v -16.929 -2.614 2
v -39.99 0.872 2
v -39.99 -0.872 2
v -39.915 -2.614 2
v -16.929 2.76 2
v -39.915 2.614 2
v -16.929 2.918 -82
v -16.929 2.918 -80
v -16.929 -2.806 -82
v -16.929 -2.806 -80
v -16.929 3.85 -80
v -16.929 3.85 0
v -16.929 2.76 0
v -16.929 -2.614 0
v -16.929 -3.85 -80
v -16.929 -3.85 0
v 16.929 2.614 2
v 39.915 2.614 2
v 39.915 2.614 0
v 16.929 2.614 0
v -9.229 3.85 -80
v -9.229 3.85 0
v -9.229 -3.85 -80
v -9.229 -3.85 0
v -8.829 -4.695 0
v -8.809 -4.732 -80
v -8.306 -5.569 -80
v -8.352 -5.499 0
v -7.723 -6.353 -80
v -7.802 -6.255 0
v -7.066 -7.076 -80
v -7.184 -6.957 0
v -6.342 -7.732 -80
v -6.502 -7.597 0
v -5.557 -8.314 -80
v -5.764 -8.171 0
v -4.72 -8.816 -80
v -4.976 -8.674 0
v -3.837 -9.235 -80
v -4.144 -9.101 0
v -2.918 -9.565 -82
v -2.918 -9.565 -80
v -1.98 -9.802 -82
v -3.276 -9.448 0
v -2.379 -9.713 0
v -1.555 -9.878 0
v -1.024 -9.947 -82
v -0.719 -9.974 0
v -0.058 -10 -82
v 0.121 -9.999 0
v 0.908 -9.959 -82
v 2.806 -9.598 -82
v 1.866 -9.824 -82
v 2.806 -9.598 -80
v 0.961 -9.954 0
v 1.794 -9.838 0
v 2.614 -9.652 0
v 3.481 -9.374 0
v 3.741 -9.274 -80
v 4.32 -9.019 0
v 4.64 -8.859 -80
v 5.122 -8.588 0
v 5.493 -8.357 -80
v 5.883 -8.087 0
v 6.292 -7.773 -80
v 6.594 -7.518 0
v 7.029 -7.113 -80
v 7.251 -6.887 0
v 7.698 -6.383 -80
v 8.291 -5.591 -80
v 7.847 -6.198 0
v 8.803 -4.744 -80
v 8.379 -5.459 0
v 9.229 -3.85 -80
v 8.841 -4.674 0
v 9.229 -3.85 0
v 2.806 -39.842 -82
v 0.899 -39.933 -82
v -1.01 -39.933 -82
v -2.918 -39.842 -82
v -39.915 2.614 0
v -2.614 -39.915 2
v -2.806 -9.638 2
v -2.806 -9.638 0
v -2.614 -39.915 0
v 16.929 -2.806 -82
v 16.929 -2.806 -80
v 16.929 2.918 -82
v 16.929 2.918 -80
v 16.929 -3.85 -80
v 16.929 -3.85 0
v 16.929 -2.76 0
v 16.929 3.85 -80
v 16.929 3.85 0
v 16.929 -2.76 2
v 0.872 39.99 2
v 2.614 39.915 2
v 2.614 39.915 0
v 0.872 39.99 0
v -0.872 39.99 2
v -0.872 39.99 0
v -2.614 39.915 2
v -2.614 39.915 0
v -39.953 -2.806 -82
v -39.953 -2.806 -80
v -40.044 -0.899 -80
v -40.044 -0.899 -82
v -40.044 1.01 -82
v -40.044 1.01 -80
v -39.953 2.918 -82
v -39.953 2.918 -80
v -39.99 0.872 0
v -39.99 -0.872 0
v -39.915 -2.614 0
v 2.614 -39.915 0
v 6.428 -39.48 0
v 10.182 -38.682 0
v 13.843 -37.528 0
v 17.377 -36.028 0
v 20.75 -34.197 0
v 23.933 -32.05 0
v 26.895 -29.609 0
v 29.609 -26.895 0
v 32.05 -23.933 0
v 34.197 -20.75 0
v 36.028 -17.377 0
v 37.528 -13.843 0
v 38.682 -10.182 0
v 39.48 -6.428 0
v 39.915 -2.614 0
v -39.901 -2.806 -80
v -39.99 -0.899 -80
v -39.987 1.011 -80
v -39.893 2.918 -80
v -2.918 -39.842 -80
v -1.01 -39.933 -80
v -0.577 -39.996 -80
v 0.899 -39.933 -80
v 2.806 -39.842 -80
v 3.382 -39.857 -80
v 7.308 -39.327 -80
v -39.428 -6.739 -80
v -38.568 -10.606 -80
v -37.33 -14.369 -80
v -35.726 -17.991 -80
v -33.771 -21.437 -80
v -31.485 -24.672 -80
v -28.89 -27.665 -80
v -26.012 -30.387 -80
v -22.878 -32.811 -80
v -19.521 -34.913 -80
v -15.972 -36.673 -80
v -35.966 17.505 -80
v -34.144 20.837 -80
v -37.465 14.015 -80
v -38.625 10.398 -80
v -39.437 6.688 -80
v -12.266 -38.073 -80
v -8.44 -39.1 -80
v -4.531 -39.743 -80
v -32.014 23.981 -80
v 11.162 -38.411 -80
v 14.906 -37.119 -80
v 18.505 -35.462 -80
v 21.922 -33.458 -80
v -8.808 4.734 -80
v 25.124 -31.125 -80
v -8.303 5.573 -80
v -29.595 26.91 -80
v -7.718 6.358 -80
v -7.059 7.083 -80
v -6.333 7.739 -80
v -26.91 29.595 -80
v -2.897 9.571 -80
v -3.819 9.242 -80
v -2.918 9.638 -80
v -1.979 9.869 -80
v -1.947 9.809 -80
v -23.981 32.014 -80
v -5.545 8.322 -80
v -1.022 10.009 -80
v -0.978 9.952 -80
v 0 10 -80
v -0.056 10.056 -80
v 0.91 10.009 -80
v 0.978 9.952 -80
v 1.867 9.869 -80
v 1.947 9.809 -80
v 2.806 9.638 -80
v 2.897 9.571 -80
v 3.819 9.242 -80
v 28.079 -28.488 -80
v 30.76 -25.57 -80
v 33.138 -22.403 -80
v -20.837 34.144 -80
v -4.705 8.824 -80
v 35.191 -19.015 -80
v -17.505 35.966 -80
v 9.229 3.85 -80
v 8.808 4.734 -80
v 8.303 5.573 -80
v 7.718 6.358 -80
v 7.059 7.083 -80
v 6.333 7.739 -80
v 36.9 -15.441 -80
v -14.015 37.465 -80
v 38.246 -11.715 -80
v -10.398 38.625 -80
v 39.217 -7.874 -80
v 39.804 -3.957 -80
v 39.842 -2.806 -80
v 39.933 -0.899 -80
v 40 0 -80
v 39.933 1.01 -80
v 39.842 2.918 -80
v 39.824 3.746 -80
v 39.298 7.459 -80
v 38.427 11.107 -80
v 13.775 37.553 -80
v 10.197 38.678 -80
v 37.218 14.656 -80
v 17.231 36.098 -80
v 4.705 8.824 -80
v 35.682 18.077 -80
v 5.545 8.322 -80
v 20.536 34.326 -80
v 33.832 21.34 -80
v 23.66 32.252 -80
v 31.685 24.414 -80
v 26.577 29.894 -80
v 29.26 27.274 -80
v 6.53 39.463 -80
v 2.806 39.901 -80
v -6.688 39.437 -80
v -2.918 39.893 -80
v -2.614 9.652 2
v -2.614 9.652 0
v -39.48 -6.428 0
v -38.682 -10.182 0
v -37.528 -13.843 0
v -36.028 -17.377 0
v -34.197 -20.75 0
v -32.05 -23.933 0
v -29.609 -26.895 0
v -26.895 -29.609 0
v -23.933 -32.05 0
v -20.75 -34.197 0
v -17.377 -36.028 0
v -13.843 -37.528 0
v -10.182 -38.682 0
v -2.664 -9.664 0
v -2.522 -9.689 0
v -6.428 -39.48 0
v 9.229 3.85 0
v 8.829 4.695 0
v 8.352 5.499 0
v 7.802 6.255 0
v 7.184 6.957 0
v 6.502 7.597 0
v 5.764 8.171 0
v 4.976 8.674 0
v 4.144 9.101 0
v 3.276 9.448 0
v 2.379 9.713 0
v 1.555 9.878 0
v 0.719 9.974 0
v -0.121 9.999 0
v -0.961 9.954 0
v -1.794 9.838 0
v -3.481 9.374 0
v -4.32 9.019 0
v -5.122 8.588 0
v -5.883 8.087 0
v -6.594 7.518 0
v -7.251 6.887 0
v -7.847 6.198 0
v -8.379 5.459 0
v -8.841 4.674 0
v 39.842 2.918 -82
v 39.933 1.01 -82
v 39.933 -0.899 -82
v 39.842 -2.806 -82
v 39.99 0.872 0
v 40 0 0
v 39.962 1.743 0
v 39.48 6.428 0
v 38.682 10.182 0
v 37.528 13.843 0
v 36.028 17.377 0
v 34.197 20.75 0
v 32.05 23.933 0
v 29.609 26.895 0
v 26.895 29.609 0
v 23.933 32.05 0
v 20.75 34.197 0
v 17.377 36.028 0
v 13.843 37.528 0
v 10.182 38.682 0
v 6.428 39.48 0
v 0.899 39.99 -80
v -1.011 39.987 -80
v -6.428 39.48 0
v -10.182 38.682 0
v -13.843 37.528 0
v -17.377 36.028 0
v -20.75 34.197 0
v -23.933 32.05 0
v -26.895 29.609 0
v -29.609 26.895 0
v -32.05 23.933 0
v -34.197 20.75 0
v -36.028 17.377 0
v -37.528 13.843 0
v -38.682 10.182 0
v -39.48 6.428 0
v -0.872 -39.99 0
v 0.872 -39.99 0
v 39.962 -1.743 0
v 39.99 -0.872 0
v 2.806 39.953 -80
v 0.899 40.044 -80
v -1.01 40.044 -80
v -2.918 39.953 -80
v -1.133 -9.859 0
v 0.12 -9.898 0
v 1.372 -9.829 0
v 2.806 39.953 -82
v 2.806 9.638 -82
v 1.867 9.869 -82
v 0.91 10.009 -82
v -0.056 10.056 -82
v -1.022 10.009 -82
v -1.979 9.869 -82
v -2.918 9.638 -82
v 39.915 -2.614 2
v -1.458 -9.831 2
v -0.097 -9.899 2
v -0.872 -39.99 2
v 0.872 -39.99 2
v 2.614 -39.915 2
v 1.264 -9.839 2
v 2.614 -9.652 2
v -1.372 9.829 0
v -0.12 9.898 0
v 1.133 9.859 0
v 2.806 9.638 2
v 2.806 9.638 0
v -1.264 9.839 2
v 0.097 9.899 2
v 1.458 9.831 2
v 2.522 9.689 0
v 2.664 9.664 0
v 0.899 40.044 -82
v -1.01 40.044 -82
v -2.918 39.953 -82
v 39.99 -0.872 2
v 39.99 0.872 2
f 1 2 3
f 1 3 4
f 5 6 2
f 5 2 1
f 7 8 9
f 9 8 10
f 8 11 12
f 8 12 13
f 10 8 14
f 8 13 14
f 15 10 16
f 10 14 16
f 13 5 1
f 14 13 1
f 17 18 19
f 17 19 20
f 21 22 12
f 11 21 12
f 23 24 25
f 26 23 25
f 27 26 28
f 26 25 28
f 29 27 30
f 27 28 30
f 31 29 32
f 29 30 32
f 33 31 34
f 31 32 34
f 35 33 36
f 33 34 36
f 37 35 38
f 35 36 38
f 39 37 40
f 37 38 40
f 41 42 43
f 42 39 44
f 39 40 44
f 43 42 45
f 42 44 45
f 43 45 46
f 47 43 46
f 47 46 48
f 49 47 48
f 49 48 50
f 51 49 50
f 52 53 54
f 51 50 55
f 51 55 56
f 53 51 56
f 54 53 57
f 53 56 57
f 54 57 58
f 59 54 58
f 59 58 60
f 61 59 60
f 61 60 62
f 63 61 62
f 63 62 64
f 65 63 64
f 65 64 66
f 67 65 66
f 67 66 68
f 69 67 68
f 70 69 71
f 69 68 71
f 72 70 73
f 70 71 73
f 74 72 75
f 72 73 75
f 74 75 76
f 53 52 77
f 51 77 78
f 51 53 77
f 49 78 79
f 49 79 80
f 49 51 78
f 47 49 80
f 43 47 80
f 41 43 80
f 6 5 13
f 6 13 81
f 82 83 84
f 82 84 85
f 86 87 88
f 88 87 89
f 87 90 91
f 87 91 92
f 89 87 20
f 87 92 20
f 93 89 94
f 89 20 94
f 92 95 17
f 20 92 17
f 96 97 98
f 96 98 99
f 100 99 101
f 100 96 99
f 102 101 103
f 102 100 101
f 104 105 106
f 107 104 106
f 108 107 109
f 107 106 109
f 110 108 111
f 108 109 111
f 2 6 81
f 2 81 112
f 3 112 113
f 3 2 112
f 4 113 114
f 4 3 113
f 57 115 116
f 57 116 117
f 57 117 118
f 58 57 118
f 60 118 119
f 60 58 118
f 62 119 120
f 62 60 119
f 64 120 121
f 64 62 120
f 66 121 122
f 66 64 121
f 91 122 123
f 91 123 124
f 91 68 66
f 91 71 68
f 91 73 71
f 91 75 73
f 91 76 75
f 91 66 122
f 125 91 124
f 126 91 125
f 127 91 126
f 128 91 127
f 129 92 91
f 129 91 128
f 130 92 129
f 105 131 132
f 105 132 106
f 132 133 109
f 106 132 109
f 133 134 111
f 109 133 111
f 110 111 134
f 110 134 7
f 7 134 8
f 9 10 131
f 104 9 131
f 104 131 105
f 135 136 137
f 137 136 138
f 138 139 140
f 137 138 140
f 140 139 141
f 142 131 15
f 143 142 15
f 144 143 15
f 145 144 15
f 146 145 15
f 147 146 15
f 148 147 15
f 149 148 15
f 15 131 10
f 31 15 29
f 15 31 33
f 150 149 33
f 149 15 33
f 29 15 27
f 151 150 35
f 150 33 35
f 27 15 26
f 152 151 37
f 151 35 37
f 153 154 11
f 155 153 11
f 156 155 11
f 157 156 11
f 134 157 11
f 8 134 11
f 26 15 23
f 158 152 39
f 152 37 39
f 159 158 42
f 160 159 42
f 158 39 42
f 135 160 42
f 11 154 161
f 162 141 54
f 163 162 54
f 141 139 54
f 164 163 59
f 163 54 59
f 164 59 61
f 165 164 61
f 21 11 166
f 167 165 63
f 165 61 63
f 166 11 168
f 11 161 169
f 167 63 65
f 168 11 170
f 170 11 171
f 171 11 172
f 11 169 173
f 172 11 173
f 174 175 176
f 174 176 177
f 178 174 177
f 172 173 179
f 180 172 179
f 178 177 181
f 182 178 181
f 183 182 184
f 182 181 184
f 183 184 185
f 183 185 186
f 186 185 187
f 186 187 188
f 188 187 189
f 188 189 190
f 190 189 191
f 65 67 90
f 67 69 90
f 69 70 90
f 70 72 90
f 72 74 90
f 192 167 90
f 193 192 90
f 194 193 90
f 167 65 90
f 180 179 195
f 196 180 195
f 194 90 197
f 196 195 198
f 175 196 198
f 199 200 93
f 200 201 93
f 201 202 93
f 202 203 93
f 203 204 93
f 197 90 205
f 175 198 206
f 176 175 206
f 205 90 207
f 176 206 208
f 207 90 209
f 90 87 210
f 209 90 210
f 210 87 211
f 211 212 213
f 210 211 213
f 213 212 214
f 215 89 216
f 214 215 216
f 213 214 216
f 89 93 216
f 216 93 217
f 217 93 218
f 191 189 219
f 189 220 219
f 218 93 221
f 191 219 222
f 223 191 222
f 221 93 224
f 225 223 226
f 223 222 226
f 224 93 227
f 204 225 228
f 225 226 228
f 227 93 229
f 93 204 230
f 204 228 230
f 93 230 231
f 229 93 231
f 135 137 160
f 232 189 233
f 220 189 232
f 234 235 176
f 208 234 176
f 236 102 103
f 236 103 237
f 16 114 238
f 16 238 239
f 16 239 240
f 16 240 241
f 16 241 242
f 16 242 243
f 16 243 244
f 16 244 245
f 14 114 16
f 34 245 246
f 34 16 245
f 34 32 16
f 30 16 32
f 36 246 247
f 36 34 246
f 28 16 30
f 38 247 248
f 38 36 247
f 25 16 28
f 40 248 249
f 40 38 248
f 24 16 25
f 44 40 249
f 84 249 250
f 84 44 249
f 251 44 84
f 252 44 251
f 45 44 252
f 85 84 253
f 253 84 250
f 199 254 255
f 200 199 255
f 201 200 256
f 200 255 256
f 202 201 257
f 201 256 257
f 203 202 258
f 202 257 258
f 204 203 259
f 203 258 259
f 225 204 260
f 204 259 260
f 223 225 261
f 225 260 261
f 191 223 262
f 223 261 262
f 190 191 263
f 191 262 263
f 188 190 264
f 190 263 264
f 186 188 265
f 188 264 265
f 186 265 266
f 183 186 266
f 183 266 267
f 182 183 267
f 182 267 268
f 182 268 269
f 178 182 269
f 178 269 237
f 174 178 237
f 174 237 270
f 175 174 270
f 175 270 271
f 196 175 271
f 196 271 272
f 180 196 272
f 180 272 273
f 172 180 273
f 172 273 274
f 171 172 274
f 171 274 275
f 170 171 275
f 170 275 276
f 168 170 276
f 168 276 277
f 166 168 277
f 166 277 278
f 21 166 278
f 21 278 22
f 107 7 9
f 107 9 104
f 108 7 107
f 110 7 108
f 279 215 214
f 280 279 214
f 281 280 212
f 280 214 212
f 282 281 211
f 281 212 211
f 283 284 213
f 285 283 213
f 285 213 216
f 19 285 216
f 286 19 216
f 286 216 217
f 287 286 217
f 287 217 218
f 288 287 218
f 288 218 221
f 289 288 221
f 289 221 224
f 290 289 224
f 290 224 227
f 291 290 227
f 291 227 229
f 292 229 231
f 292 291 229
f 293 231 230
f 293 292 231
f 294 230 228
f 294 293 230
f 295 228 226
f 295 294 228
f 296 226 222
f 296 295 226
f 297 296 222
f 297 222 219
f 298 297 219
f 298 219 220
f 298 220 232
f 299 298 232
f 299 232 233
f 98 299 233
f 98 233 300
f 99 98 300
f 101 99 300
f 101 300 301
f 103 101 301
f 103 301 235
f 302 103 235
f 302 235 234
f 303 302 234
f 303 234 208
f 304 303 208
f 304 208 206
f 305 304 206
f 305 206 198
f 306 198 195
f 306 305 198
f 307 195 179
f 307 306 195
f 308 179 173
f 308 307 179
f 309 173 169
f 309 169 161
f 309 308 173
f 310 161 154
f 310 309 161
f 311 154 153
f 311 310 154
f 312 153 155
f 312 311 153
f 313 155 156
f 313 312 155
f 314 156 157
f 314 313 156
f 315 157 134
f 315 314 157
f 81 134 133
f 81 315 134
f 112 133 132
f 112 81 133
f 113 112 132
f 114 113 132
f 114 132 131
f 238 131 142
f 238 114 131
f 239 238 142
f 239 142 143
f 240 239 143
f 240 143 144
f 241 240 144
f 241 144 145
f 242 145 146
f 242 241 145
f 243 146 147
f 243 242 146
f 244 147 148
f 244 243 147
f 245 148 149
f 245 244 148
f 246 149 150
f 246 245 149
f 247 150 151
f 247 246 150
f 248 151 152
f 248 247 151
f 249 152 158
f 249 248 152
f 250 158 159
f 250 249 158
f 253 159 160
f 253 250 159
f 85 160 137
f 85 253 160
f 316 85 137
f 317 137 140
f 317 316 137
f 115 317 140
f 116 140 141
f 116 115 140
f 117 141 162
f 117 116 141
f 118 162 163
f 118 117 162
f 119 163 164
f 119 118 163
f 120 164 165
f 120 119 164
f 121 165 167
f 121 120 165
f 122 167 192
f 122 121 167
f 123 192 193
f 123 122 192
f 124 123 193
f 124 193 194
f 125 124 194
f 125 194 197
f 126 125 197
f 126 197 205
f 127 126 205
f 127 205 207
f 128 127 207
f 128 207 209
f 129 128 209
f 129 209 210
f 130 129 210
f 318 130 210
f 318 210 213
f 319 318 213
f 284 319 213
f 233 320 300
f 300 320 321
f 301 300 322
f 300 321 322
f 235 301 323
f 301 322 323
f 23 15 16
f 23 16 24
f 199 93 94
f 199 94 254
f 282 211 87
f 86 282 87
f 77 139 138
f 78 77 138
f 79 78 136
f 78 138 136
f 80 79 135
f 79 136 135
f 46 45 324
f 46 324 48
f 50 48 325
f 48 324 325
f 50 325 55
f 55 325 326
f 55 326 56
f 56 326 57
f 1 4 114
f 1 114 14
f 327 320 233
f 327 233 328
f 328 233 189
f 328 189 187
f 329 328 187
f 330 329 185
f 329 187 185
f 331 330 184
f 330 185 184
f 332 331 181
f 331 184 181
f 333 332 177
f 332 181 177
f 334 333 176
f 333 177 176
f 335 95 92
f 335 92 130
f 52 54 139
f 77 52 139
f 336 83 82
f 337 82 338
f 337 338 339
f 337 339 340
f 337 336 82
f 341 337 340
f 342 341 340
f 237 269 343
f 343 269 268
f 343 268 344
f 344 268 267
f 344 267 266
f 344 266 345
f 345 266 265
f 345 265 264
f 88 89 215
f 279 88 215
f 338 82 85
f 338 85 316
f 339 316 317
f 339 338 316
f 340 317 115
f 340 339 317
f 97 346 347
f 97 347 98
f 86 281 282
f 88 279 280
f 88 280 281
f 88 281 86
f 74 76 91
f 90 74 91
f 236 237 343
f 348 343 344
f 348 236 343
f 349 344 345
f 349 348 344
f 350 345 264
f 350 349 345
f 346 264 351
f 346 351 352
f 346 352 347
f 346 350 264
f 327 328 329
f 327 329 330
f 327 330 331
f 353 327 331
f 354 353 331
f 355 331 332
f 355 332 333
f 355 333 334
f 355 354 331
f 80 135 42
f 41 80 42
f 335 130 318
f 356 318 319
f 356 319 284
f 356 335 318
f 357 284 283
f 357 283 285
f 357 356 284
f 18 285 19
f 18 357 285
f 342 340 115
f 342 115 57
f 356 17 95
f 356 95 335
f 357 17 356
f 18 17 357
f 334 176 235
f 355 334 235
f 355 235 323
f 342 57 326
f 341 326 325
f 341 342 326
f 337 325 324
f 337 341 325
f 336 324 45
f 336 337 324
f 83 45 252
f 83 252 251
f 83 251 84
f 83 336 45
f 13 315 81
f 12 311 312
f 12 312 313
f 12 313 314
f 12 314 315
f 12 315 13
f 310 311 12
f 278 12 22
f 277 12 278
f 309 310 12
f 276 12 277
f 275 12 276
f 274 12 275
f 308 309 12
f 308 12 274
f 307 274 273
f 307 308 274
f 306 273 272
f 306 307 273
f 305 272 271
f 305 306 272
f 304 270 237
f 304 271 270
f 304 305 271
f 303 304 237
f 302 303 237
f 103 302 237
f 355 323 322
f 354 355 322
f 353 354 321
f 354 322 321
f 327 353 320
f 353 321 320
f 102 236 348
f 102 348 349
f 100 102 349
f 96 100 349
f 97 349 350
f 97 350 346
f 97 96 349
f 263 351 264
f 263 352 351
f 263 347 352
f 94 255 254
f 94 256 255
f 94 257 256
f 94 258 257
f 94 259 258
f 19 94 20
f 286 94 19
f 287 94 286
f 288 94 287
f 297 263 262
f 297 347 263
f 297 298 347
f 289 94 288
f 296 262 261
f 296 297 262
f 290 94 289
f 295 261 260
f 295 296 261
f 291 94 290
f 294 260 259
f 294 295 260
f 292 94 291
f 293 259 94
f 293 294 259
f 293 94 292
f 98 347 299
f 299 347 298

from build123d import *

# Parameters (mm, degrees)
SKETCH1_R           = 40
BOSS_EXTRUDE1_DEPTH = 80
SKETCH2_R           = 10
CUT_EXTRUDE1_DEPTH  = 50
BOSS_EXTRUDE3_DEPTH = 2
SKETCH7_R           = 10
CUT_EXTRUDE2_DEPTH  = 40
CUT_EXTRUDE3_DEPTH  = 86
BOSS_EXTRUDE5_START = 2
BOSS_EXTRUDE5_DEPTH = 2
SKETCH14_W          = 33.858331452
SKETCH14_H          = 7.7
CUT_EXTRUDE6_DEPTH  = 9


with BuildPart() as part:
    # Sketch1 → Boss-Extrude1 (new body)
    with BuildSketch(Plane.XY):
        Circle(SKETCH1_R)
    extrude(amount=-BOSS_EXTRUDE1_DEPTH)

    # Sketch2 → Cut-Extrude1 (cut)
    with BuildSketch(Plane.XY):
        Circle(SKETCH2_R)
    extrude(amount=-CUT_EXTRUDE1_DEPTH, mode=Mode.SUBTRACT)

    # Sketch5 → Boss-Extrude3 (add)
    with BuildSketch(Plane(origin=(0, 0, -80), x_dir=(-1, 0, 0), z_dir=(0, 0, -1))):
        with BuildLine():
            Line((-2.80604214, 39.953294916), (-2.80604214, 9.637548447))
            ThreePointArc((-2.80604214, 9.637548447), (0.055803254, 10.055803254), (2.917648647, 9.637548447))
            Line((2.917648647, 9.637548447), (2.917648647, 39.953294916))
            ThreePointArc((2.917648647, 39.953294916), (0.055803254, 40.055803254), (-2.80604214, 39.953294916))
        make_face()
        with BuildLine():
            Line((39.953294916, 2.917648647), (9.637548447, 2.917648647))
            ThreePointArc((9.637548447, 2.917648647), (10.055803254, 0.055803254), (9.637548447, -2.80604214))
            Line((9.637548447, -2.80604214), (39.953294916, -2.80604214))
            ThreePointArc((39.953294916, -2.80604214), (40.055803254, 0.055803254), (39.953294916, 2.917648647))
        make_face()
        with BuildLine():
            Line((2.917648647, -39.841688409), (2.917648647, -9.525941939))
            ThreePointArc((2.917648647, -9.525941939), (0.055803254, -9.944196746), (-2.80604214, -9.525941939))
            Line((-2.80604214, -9.525941939), (-2.80604214, -39.841688409))
            ThreePointArc((-2.80604214, -39.841688409), (0.055803254, -39.944196746), (2.917648647, -39.841688409))
        make_face()
        with BuildLine():
            Line((-39.841688409, -2.80604214), (-9.525941939, -2.80604214))
            ThreePointArc((-9.525941939, -2.80604214), (-9.944196746, 0.055803254), (-9.525941939, 2.917648647))
            Line((-9.525941939, 2.917648647), (-39.841688409, 2.917648647))
            ThreePointArc((-39.841688409, 2.917648647), (-39.944196746, 0.055803254), (-39.841688409, -2.80604214))
        make_face()
    extrude(amount=BOSS_EXTRUDE3_DEPTH)

    # Sketch7 → Cut-Extrude2 (cut)
    with BuildSketch(Plane.XY.offset(-50)):
        Circle(SKETCH7_R)
    extrude(amount=-CUT_EXTRUDE2_DEPTH, mode=Mode.SUBTRACT)

    # Sketch10 → Cut-Extrude3 (cut)
    with BuildSketch(Plane.XY):
        with BuildLine():
            ThreePointArc((-9.229165726, -3.85), (-10, 0), (-9.229165726, 3.85))
            Line((-9.229165726, 3.85), (-16.929165726, 3.85))
            Line((-16.929165726, 3.85), (-16.929165726, -3.85))
            Line((-16.929165726, -3.85), (-9.229165726, -3.85))
        make_face()
        with BuildLine():
            Line((16.929165726, 3.85), (9.229165726, 3.85))
            ThreePointArc((9.229165726, 3.85), (9.805397933, 1.963204363), (10, 0))
            ThreePointArc((10, 0), (9.805397933, -1.963204363), (9.229165726, -3.85))
            Line((9.229165726, -3.85), (16.929165726, -3.85))
            Line((16.929165726, -3.85), (16.929165726, 3.85))
        make_face()
    extrude(amount=-CUT_EXTRUDE3_DEPTH, mode=Mode.SUBTRACT)

    # Sketch12 → Boss-Extrude5 (add)
    with BuildSketch(Plane.XY.offset(BOSS_EXTRUDE5_START)):
        with BuildLine():
            Line((-2.61385984, 39.914505342), (-2.61385984, 9.652343588))
            ThreePointArc((-2.61385984, 9.652343588), (0.096784019, 9.898764617), (2.80604214, 9.637548447))
            Line((2.80604214, 9.637548447), (2.61385984, 39.914505342))
            ThreePointArc((2.61385984, 39.914505342), (0, 40), (-2.61385984, 39.914505342))
        make_face()
        with BuildLine():
            Line((39.914505342, 2.61385984), (9.652343588, 2.61385984))
            ThreePointArc((9.652343588, 2.61385984), (9.898764617, -0.096784019), (9.637548447, -2.80604214))
            Line((9.637548447, -2.80604214), (39.914505342, -2.61385984))
            ThreePointArc((39.914505342, -2.61385984), (40, 0), (39.914505342, 2.61385984))
        make_face()
        with BuildLine():
            Line((2.61385984, -39.914505342), (2.61385984, -9.652343588))
            ThreePointArc((2.61385984, -9.652343588), (-0.096784019, -9.898764617), (-2.80604214, -9.637548447))
            Line((-2.80604214, -9.637548447), (-2.61385984, -39.914505342))
            ThreePointArc((-2.61385984, -39.914505342), (0, -40), (2.61385984, -39.914505342))
        make_face()
        with BuildLine():
            Line((-39.914505342, -2.61385984), (-9.652343588, -2.61385984))
            ThreePointArc((-9.652343588, -2.61385984), (-9.898764617, 0.096784019), (-9.637548447, 2.80604214))
            Line((-9.637548447, 2.80604214), (-39.914505342, 2.61385984))
            ThreePointArc((-39.914505342, 2.61385984), (-40, 0), (-39.914505342, -2.61385984))
        make_face()
    extrude(amount=-BOSS_EXTRUDE5_DEPTH)

    # Sketch14 → Cut-Extrude6 (cut)
    with BuildSketch(Plane.XY.offset(2)):
        Rectangle(SKETCH14_W, SKETCH14_H)
    extrude(amount=-CUT_EXTRUDE6_DEPTH, mode=Mode.SUBTRACT)


solid = part.part
